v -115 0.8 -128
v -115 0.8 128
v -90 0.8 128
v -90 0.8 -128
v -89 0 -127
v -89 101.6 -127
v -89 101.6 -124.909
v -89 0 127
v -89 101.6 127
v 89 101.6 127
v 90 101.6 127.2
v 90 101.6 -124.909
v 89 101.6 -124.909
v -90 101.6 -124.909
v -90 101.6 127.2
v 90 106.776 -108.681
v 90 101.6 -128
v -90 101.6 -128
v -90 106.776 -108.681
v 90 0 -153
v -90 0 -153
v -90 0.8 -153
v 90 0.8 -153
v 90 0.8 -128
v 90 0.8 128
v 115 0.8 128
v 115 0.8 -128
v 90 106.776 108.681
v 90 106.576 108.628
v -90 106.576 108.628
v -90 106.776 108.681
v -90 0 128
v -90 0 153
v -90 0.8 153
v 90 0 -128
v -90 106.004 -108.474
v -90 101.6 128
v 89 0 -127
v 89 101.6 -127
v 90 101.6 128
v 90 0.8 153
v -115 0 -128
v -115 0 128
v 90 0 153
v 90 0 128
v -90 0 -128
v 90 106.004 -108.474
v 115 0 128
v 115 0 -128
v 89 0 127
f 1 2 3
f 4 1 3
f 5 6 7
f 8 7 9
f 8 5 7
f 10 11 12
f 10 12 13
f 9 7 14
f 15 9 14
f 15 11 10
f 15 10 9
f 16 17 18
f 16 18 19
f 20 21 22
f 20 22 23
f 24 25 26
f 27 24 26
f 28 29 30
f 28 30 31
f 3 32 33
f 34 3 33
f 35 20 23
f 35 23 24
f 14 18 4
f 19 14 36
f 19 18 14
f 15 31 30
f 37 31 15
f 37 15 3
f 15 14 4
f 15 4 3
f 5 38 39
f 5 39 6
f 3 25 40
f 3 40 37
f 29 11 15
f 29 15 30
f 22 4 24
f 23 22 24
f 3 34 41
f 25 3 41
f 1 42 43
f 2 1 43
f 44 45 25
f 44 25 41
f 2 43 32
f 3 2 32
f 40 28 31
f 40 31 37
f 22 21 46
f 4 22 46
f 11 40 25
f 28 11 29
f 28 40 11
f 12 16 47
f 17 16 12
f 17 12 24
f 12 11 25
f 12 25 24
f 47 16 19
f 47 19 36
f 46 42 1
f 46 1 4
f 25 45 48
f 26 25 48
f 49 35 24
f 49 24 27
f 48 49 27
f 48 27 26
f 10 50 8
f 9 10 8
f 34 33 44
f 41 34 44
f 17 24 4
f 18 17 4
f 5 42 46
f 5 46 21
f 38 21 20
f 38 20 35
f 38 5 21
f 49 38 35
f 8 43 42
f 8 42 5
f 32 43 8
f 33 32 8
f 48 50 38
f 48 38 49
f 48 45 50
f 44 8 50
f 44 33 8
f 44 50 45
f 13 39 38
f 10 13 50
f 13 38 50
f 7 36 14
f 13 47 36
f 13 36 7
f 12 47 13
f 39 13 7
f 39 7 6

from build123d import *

# Parameters (mm, degrees)
SKETCH1_W         = 180
SKETCH1_H         = 256
SKETCH1_W_2       = 178
SKETCH1_H_2       = 254
EXTRUSION1_DEPTH  = 101.6
SKETCH2_W         = 180
SKETCH2_H         = 25
SKETCH2_W_2       = 25
SKETCH2_H_2       = 256
EXTRUSION3_DEPTH  = 0.8
EXTRUSION10_REACH = 277.239


with BuildPart() as part:
    # Sketch1 → Extrusion1 (new body)
    with BuildSketch(Plane(origin=(0, 0, 0), x_dir=(-1, 0, 0), z_dir=(0, 1, 0))):
        Rectangle(SKETCH1_W, SKETCH1_H)
        Rectangle(SKETCH1_W_2, SKETCH1_H_2, mode=Mode.SUBTRACT)
    extrude(amount=EXTRUSION1_DEPTH)

    # Sketch2 → Extrusion3 (add)
    with BuildSketch(Plane.XZ):
        with Locations((0, 140.5)):
            Rectangle(SKETCH2_W, SKETCH2_H)
        with Locations((0, -140.5)):
            Rectangle(SKETCH2_W, SKETCH2_H)
        with Locations((102.5, 0)):
            Rectangle(SKETCH2_W_2, SKETCH2_H_2)
        with Locations((-102.5, 0)):
            Rectangle(SKETCH2_W_2, SKETCH2_H_2)
    extrude(amount=-EXTRUSION3_DEPTH)

    # Extrusion10: up to this face of the body (flat: up to its plane)
    extrusion10_end = Plane(part.part.faces().sort_by_distance((-90, 0.4, 140.5))[0])
    # Sketch5 → Extrusion10 (add, up to the picked face)
    with BuildSketch(Plane(origin=(90, 0, 0), x_dir=(0, 0, -1), z_dir=(1, 0, 0)), mode=Mode.PRIVATE) as extrusion10_sk1:
        Polygon((-128, 101.6), (-127.2, 101.6), (-108.627893636, 106.576380902), (-108.681483474, 106.776380902), align=None)
    extrusion10_tool1 = split(extrude(extrusion10_sk1.sketch, amount=-EXTRUSION10_REACH, mode=Mode.PRIVATE), bisect_by=extrusion10_end, keep=Keep.BOTH, mode=Mode.PRIVATE)
    # Sketch5 → Extrusion10 (add, up to the picked face)
    with BuildSketch(Plane(origin=(90, 0, 0), x_dir=(0, 0, -1), z_dir=(1, 0, 0)), mode=Mode.PRIVATE) as extrusion10_sk2:
        Polygon((124.909037356, 101.6), (128, 101.6), (108.681483474, 106.776380902), (108.474428238, 106.003640241), align=None)
    extrusion10_tool2 = split(extrude(extrusion10_sk2.sketch, amount=-EXTRUSION10_REACH, mode=Mode.PRIVATE), bisect_by=extrusion10_end, keep=Keep.BOTH, mode=Mode.PRIVATE)
    add(extrusion10_tool1.solids().sort_by(Axis((90, 104.138519, 118.128746), (-1, 0, 0)))[0])
    add(extrusion10_tool2.solids().sort_by(Axis((90, 104.000199, -117.538406), (-1, 0, 0)))[0])


solid = part.part
